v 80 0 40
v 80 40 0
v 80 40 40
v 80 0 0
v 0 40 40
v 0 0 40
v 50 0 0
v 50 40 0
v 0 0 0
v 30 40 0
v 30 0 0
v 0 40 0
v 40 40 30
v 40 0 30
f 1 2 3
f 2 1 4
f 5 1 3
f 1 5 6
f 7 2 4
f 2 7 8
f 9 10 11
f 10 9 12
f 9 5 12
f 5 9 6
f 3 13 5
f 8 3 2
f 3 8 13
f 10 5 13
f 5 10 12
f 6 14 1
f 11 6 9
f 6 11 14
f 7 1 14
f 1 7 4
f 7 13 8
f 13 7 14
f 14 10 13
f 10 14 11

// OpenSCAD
$fn = 64;
// Block 80x40x40, V-notch cut from the bottom contact face.
// V root at (x=40, z=30), void angle ~37 deg; two bottom feet at z=0.
difference() {
  cube([80, 40, 40]);
  translate([0, 42, 0])
    rotate([90, 0, 0])
      linear_extrude(height = 42)
        polygon(points = [[30, 0], [50, 0], [40, 30]]);
}
